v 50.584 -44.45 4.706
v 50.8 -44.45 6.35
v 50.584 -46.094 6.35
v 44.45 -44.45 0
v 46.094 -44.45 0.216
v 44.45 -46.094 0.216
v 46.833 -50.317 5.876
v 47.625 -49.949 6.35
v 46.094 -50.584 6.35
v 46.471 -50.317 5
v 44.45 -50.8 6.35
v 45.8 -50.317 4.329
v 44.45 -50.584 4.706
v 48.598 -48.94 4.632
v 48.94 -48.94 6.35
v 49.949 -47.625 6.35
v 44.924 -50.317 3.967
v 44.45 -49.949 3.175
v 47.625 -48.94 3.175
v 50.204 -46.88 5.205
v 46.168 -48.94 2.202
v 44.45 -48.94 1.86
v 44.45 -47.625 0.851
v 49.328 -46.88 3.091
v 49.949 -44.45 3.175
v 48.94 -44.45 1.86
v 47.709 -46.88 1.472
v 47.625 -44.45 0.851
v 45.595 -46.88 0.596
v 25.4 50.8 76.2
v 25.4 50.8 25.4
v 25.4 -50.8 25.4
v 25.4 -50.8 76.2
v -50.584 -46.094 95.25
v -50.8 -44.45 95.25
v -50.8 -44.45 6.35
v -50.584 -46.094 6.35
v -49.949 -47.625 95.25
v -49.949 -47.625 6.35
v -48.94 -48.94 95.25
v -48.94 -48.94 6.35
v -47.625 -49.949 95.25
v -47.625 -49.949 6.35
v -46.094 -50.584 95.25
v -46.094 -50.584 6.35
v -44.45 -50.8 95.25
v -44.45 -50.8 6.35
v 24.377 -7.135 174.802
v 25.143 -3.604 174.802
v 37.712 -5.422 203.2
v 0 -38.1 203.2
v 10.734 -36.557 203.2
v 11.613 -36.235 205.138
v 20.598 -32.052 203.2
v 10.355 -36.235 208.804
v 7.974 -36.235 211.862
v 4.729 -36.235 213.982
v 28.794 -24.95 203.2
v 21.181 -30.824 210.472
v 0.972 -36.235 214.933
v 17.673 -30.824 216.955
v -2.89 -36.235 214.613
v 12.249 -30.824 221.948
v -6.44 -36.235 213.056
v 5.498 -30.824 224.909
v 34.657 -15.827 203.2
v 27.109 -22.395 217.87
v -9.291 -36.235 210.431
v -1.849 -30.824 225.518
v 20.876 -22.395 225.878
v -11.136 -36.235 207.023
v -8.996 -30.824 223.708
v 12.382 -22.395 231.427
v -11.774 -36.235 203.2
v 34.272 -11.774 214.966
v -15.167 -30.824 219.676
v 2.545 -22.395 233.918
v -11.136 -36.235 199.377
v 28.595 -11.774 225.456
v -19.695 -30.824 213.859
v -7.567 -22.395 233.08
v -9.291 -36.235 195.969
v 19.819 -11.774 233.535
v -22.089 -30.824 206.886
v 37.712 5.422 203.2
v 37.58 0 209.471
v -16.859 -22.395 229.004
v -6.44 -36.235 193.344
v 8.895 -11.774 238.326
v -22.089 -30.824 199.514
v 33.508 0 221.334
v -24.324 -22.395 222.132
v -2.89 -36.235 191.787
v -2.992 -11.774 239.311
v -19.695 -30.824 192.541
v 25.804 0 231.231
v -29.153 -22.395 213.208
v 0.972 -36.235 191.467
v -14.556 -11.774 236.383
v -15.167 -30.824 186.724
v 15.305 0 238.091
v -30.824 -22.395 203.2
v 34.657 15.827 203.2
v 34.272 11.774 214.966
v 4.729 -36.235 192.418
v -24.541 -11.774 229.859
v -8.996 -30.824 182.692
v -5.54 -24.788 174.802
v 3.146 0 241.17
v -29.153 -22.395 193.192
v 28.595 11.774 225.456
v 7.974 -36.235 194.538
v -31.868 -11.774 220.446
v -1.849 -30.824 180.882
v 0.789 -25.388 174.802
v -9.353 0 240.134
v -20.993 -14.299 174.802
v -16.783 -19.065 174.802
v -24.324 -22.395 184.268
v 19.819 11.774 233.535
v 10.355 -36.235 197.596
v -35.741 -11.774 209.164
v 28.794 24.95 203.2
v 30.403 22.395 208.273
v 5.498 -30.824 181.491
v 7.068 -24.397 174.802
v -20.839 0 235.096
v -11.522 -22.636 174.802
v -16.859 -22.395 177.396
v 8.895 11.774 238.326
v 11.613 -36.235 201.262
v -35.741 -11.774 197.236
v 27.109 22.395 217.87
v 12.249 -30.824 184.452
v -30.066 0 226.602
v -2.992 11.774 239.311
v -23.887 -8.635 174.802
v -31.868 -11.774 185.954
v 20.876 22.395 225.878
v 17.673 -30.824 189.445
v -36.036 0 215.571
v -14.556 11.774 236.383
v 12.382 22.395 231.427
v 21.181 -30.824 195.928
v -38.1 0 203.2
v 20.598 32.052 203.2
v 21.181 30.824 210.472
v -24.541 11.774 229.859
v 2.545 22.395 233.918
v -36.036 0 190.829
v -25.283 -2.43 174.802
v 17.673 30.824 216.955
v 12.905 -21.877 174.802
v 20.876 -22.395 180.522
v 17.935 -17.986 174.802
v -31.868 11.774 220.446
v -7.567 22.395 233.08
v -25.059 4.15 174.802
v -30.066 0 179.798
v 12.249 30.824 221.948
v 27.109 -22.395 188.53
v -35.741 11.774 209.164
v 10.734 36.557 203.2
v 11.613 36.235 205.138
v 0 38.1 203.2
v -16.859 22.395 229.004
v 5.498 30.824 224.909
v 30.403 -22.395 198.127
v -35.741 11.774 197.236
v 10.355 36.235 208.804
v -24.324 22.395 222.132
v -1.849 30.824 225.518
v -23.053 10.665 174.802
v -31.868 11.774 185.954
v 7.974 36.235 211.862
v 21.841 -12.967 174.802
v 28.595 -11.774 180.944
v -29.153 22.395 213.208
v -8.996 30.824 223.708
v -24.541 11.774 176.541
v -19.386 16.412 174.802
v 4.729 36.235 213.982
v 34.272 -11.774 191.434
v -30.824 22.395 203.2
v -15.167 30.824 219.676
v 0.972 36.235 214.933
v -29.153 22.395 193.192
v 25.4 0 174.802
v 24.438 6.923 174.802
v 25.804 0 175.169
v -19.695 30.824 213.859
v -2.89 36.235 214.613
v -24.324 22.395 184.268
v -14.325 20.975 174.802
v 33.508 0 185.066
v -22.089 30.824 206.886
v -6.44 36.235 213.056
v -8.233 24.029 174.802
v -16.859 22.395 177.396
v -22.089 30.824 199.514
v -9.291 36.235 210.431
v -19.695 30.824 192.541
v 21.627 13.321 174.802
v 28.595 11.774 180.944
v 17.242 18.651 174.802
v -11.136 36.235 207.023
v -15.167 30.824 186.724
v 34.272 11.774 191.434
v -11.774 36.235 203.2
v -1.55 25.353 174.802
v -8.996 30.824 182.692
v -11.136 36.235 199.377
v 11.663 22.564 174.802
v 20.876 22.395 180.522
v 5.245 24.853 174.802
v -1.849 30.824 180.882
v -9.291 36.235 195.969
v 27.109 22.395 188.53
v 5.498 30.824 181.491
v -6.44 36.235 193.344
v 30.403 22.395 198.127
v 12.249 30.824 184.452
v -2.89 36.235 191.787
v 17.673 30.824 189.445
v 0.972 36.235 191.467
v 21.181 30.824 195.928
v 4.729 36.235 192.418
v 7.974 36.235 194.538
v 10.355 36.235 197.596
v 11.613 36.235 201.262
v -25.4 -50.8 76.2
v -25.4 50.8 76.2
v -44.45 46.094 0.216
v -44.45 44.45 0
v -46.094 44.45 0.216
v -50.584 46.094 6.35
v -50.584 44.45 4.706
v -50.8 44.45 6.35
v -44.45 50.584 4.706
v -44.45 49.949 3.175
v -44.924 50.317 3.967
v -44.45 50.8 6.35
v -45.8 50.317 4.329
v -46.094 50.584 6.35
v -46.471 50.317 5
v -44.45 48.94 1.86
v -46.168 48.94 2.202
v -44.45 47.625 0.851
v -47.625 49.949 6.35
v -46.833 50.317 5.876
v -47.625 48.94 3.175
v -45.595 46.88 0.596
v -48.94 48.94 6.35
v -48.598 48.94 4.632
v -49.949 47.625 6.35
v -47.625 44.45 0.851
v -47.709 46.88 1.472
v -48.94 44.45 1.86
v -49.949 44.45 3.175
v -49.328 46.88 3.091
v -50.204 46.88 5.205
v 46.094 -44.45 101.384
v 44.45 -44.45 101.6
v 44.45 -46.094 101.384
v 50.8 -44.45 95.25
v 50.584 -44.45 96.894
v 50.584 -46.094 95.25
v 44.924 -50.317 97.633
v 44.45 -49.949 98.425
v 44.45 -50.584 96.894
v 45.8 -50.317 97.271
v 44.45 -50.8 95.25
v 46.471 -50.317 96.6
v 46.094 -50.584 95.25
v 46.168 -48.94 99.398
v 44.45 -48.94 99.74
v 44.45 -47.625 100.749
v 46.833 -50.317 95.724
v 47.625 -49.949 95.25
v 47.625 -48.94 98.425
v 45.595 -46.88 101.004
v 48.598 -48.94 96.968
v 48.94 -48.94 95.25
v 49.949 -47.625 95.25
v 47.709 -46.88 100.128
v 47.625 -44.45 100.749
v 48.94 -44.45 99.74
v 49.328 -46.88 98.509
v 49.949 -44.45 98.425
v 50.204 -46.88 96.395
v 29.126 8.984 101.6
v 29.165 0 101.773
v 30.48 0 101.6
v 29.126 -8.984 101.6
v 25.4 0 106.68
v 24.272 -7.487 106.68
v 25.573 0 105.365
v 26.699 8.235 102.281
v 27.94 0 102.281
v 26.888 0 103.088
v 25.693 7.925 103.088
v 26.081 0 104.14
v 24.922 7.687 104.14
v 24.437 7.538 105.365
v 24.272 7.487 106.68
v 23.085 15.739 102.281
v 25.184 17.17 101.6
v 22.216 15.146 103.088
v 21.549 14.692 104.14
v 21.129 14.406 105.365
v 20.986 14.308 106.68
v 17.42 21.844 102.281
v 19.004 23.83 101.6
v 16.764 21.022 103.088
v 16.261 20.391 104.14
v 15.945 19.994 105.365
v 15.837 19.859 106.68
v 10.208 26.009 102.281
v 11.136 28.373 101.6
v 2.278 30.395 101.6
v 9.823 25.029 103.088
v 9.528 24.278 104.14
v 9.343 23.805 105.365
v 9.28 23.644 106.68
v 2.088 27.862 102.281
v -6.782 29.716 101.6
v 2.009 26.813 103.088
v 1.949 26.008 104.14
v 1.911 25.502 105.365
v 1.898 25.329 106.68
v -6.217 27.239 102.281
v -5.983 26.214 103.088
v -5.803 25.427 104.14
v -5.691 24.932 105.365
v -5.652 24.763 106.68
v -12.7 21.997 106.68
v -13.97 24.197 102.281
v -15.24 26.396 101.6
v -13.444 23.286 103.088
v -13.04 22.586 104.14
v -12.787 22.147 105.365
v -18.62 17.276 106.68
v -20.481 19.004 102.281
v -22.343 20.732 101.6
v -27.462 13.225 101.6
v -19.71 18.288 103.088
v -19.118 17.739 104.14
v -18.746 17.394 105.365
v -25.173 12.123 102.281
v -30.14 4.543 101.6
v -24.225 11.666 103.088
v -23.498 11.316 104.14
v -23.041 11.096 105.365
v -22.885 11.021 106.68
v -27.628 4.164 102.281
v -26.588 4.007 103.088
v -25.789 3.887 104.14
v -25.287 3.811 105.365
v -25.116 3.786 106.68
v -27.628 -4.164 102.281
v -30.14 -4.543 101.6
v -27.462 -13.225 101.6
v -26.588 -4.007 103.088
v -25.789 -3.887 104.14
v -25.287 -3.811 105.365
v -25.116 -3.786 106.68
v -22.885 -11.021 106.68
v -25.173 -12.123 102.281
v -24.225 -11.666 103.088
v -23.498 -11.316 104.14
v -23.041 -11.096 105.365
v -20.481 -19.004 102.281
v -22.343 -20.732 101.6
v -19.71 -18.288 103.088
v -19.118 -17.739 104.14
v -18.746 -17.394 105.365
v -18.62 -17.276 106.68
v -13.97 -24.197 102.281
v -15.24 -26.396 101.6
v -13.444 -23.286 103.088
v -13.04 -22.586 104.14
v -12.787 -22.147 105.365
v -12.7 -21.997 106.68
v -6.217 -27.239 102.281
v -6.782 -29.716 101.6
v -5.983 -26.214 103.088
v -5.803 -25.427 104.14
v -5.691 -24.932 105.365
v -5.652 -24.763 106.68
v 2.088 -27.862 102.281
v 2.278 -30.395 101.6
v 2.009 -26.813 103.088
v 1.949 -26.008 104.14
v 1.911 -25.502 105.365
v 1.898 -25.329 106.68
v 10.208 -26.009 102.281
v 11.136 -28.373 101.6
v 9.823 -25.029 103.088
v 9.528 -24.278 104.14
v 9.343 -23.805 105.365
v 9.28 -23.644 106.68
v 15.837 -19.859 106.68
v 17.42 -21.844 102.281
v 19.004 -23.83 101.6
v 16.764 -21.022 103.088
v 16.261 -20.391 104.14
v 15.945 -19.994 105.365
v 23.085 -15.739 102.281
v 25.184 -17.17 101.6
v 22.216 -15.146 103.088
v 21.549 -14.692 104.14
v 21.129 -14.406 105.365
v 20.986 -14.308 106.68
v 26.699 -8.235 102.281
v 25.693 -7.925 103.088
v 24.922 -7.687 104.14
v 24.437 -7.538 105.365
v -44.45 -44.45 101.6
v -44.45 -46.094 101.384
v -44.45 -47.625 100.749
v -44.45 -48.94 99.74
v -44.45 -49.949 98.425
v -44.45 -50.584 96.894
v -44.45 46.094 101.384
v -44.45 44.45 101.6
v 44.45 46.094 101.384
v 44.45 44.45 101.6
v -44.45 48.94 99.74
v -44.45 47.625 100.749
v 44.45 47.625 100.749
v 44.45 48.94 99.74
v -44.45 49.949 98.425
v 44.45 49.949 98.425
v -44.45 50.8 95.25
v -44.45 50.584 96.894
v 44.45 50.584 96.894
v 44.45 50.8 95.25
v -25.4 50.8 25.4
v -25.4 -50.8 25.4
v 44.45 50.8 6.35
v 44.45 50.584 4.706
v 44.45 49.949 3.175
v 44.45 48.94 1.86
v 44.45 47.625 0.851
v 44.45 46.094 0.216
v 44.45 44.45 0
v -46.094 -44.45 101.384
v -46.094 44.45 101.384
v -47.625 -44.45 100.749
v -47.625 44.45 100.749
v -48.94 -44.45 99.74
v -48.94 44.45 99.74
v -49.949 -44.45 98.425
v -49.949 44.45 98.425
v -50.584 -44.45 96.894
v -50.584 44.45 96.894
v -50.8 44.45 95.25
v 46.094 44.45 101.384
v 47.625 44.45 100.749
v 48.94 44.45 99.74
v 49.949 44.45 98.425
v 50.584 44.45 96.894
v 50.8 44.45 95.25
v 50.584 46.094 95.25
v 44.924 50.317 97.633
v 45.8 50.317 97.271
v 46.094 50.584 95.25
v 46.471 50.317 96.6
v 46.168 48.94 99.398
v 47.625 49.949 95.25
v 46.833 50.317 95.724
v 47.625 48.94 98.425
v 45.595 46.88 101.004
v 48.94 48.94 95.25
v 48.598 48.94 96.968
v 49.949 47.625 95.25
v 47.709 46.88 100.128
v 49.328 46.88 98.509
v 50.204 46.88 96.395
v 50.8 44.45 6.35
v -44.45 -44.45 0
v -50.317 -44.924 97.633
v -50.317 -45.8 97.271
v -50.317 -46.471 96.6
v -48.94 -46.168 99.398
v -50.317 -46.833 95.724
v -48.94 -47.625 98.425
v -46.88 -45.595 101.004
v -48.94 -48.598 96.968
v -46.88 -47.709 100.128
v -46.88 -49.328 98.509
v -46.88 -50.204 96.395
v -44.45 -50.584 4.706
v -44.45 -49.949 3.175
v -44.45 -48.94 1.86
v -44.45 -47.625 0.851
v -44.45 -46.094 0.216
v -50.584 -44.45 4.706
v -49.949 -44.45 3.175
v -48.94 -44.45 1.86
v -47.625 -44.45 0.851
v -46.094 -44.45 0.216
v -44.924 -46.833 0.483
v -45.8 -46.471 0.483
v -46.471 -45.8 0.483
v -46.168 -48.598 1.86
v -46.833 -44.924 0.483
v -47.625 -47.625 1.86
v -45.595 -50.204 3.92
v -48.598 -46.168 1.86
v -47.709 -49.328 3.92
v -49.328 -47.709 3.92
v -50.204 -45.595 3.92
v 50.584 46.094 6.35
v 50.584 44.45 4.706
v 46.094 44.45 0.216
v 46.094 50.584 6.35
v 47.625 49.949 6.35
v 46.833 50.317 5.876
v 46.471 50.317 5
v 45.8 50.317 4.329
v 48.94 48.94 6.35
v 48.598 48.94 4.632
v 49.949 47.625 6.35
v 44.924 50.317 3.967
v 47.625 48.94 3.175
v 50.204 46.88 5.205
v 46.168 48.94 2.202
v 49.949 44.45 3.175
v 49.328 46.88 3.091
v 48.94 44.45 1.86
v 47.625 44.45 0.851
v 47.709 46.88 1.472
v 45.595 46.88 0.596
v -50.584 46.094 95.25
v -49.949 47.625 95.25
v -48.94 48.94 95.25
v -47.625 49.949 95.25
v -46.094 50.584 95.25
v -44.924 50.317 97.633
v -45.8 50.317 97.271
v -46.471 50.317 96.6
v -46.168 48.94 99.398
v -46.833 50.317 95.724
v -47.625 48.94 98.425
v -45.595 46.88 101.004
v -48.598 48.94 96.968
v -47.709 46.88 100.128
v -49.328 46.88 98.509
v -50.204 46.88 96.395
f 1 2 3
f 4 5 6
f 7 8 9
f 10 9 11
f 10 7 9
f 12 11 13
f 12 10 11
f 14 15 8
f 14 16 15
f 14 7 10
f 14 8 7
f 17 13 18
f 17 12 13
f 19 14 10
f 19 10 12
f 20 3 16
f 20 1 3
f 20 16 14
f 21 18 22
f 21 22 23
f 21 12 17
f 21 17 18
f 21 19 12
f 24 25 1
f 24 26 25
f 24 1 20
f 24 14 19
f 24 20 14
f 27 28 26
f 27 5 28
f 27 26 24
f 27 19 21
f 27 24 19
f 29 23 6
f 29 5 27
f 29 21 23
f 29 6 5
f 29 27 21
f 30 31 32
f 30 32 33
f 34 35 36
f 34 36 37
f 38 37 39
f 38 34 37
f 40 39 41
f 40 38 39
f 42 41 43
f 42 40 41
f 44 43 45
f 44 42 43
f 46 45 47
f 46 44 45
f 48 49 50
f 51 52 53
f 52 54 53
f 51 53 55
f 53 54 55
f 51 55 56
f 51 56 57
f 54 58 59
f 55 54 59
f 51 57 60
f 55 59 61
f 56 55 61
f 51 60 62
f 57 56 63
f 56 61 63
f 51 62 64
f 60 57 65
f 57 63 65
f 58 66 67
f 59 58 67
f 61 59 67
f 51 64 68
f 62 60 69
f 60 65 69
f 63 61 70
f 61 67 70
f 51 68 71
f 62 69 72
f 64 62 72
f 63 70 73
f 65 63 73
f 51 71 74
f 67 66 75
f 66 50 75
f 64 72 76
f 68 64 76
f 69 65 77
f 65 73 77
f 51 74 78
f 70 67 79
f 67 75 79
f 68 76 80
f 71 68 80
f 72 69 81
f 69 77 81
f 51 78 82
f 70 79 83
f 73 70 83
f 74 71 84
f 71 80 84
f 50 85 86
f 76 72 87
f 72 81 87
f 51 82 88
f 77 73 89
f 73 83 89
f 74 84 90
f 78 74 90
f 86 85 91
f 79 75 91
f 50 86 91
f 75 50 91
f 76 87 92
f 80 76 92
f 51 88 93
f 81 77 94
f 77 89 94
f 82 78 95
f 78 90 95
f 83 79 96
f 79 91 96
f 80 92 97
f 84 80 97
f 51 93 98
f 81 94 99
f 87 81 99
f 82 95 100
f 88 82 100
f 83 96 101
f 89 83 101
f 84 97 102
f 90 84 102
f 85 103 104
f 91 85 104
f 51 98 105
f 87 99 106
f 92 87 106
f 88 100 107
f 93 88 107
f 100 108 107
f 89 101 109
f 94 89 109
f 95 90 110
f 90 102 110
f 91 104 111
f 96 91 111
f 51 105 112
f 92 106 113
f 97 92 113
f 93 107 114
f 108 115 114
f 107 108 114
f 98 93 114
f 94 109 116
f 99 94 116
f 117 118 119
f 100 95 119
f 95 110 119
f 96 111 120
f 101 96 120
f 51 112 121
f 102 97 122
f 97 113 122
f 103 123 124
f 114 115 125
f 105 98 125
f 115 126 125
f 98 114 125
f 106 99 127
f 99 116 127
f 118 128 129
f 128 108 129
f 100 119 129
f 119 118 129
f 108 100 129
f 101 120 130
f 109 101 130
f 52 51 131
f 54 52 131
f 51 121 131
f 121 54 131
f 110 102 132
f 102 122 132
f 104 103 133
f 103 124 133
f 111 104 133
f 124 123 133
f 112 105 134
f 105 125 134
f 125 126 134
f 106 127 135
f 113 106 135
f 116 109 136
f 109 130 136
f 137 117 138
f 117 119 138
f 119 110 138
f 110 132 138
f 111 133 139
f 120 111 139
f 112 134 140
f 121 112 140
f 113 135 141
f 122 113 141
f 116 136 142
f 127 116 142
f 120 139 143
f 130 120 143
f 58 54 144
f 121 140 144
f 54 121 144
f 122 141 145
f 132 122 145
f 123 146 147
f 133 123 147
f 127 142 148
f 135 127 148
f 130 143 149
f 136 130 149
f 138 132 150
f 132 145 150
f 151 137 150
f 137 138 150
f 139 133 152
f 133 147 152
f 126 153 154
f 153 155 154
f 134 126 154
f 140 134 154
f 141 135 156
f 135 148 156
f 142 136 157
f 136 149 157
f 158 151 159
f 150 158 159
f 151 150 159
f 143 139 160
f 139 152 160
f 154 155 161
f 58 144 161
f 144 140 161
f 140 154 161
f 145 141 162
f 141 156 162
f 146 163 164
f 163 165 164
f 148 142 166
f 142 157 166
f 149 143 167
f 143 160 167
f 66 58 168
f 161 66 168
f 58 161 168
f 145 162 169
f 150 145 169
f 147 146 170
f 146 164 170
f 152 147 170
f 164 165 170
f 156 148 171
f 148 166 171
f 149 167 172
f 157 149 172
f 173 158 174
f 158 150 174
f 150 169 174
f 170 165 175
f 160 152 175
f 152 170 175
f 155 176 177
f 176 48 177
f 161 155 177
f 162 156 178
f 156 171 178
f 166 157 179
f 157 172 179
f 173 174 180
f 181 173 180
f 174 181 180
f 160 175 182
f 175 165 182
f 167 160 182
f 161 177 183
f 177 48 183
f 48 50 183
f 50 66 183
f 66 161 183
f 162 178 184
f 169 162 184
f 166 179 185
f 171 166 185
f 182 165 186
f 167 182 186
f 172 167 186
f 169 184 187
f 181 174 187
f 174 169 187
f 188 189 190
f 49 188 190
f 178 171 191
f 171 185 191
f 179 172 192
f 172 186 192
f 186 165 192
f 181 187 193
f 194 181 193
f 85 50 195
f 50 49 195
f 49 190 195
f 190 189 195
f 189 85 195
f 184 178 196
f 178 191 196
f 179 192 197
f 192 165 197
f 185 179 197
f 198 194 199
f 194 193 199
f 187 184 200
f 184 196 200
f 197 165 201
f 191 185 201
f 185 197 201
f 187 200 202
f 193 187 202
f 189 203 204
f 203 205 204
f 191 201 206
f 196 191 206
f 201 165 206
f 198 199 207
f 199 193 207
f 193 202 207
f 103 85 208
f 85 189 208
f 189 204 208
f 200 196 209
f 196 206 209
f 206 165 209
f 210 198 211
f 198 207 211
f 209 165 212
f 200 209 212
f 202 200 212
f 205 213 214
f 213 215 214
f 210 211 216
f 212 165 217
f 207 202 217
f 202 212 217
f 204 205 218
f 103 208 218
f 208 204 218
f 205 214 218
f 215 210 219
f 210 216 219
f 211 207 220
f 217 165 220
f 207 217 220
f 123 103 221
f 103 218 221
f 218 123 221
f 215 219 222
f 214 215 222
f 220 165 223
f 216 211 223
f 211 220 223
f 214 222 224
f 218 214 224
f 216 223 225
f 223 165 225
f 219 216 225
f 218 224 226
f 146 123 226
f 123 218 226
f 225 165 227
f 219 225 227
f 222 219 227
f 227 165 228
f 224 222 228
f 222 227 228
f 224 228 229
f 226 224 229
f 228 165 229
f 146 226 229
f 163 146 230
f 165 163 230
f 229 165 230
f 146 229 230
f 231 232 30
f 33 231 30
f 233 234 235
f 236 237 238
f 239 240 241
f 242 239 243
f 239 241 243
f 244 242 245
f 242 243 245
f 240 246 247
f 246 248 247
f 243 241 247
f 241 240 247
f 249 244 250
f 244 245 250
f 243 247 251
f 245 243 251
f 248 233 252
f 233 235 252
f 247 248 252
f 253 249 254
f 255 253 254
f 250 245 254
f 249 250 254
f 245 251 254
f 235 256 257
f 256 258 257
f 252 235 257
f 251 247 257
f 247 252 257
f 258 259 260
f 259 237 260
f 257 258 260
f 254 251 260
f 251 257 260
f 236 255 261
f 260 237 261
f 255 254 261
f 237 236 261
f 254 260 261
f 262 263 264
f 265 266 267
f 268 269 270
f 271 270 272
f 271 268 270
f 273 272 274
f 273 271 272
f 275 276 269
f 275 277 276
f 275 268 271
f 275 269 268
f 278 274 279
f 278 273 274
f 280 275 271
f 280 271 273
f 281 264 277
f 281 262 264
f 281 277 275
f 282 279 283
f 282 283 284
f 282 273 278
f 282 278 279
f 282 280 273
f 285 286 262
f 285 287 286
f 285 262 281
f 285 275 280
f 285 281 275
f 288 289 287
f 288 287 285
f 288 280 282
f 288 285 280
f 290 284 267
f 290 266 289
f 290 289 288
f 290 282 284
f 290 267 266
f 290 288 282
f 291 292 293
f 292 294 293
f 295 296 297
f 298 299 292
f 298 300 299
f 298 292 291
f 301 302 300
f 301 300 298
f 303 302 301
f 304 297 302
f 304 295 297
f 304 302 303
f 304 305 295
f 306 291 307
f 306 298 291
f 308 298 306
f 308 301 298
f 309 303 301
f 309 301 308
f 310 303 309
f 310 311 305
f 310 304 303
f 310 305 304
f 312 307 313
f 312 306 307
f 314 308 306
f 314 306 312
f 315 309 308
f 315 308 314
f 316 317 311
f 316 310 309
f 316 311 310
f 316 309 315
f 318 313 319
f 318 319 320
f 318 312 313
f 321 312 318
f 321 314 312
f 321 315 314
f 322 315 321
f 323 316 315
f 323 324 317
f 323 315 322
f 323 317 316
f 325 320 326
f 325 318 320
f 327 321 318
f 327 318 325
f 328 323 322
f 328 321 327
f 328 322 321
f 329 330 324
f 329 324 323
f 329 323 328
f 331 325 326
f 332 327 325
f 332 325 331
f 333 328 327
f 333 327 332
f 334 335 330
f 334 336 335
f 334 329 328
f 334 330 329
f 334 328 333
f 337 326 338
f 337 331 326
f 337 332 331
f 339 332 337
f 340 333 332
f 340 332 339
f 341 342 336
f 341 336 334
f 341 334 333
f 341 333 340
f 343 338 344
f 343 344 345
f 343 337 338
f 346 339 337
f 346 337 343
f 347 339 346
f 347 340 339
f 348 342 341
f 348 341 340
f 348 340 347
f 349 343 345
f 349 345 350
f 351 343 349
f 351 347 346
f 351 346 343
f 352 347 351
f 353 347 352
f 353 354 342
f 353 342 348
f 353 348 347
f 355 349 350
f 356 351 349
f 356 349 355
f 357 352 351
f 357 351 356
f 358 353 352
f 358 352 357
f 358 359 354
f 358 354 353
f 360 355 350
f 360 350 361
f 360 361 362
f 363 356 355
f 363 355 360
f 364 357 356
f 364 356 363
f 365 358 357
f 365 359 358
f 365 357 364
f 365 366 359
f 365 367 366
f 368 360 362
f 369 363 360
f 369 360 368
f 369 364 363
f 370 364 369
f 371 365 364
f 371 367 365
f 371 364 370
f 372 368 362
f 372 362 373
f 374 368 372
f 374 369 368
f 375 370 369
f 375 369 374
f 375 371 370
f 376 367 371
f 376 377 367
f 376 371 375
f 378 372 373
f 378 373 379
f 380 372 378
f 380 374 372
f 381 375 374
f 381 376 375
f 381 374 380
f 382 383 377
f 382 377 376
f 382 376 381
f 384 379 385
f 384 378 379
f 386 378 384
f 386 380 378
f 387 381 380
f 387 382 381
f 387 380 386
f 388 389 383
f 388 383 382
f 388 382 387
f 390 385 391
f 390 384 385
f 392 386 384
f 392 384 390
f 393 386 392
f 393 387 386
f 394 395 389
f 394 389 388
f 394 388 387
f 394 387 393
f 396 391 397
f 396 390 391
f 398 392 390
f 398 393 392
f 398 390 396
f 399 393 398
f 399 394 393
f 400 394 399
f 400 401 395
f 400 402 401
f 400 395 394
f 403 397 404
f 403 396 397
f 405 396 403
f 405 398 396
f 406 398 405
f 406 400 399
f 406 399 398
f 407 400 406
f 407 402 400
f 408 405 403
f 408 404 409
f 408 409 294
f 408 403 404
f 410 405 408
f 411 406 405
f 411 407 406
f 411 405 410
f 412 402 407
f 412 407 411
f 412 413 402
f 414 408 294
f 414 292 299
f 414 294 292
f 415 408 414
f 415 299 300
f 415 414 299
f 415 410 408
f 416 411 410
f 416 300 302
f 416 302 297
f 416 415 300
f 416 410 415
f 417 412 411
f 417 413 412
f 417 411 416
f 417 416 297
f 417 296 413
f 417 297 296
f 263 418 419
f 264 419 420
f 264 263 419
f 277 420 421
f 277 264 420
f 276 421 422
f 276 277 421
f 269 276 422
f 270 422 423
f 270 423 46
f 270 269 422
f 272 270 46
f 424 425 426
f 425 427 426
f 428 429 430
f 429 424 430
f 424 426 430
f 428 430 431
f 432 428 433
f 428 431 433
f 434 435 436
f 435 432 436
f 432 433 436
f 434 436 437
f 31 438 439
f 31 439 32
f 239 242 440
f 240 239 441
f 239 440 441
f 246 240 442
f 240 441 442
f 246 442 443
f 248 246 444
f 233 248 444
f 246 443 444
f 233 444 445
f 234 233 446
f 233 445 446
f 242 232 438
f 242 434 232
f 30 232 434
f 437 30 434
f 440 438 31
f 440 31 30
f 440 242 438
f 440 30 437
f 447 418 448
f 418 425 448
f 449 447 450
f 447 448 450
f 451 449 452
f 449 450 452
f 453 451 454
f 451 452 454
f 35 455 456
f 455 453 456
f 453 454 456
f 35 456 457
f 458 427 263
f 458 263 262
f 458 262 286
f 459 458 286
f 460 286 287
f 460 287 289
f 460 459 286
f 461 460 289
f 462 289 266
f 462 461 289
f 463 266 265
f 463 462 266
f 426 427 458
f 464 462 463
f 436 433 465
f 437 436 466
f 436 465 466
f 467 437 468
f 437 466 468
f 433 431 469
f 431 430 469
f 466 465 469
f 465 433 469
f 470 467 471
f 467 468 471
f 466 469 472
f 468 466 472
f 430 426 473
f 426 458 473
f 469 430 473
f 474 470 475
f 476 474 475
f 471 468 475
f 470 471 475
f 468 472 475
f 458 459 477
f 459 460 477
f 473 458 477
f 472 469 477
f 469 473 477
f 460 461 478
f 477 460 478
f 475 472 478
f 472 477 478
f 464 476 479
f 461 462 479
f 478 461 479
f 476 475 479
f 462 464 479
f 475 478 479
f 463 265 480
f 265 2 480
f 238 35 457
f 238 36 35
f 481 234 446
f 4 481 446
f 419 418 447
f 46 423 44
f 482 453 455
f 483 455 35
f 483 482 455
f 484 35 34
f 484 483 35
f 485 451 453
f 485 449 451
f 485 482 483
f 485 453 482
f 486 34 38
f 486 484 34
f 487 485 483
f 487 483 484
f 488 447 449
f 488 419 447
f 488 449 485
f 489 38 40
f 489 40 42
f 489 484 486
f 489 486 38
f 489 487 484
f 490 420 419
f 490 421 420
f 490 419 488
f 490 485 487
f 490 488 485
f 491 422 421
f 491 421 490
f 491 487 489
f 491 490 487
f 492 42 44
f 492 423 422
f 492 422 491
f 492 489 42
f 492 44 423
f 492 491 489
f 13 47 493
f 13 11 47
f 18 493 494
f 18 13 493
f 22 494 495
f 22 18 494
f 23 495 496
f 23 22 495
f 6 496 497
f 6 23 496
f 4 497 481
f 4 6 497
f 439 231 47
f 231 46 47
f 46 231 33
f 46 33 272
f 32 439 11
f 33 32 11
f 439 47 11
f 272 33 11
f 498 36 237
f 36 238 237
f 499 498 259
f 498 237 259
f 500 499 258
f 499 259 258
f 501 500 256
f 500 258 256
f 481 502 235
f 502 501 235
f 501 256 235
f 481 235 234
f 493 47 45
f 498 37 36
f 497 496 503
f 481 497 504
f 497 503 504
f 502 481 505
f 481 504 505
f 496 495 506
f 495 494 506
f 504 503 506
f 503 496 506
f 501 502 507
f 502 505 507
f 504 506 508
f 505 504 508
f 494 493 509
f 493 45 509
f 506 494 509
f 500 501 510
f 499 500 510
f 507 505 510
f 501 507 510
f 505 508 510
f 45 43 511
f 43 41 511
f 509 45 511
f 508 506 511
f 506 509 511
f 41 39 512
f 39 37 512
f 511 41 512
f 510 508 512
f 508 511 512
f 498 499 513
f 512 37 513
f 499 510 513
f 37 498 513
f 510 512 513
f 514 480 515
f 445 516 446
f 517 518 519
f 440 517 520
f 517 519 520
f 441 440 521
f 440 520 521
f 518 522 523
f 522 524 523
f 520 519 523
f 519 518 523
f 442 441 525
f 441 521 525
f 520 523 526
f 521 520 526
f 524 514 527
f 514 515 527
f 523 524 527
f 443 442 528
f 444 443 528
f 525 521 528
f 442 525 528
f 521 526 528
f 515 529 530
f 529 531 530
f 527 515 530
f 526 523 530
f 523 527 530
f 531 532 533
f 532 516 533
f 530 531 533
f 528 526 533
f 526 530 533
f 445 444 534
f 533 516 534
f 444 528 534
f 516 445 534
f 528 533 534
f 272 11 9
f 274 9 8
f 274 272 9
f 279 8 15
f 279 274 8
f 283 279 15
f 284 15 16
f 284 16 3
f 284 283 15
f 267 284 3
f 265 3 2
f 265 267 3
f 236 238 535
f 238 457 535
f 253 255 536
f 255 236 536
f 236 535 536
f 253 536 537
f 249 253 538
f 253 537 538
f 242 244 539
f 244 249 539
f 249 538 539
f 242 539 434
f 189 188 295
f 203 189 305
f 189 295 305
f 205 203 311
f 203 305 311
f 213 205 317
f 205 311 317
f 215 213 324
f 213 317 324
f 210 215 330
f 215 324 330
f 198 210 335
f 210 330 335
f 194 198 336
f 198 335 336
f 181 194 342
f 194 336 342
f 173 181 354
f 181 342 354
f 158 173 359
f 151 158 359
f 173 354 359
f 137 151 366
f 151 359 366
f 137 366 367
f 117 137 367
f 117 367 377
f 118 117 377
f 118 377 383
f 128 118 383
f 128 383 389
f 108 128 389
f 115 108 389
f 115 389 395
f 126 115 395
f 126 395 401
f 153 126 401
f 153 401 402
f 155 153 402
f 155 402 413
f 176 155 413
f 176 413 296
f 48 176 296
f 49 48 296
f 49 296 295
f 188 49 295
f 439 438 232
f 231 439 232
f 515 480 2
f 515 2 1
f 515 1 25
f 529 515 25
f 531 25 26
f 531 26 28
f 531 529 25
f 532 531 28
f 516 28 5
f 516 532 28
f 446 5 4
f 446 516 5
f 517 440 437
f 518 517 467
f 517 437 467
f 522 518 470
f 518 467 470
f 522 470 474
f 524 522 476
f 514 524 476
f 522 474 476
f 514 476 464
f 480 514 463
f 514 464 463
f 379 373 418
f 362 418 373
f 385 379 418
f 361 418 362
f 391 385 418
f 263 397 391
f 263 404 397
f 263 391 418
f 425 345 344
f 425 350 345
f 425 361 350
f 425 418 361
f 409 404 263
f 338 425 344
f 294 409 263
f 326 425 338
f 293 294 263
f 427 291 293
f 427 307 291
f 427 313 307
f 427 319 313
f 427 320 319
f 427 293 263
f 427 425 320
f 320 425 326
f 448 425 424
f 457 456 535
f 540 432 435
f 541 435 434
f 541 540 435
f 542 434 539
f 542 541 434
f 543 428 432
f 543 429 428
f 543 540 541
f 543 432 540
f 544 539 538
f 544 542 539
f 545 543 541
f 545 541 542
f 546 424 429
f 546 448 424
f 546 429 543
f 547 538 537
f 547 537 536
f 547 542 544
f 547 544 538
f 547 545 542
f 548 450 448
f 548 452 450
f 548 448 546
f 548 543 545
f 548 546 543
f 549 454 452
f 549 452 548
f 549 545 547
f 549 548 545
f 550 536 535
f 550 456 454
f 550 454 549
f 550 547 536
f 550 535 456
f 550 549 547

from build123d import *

# Parameters (mm, degrees)
F0_W     = 101.6
F0_H     = 101.6
F1_DEPTH = 101.6
F2_R     = 25.4
F3_DEPTH = 101.6
F6_W     = 50.8
F6_H     = 50.8
F7_DEPTH = 101.6
F8_R     = 6.35
F9_R     = 5.08


with BuildPart() as f1:
    # F0 (on Top) → F1 (new body)
    with BuildSketch(Plane.XY):
        Rectangle(F0_W, F0_H)
    extrude(amount=F1_DEPTH)

    # F2 (on face) → F3 (join)
    with BuildSketch(Plane.XY.offset(101.6)):
        Circle(F2_R)
    extrude(amount=F3_DEPTH)

    # F4 (on face) → F5 (revolve)
    with BuildSketch(Plane.XY.offset(203.2)):
        with BuildLine():
            Line((0, -25.4), (0, -38.1))
            ThreePointArc((0, -38.1), (38.1, 0), (0, 38.1))
            Line((0, 38.1), (0, 25.4))
            ThreePointArc((0, 25.4), (17.9605122421, 17.9605122421), (25.4, 0))
            ThreePointArc((25.4, 0), (17.9605122421, -17.9605122421), (0, -25.4))
        make_face()
        with BuildLine():
            Line((0, 25.4), (0, -25.4))
            ThreePointArc((0, -25.4), (17.9605122421, -17.9605122421), (25.4, 0))
            ThreePointArc((25.4, 0), (17.9605122421, 17.9605122421), (0, 25.4))
        make_face()
    revolve(axis=Axis((0, 0, 203.2), (0, -1, 0)))

    # F6 (on face) → F7 (cut)
    with BuildSketch(Plane.XZ.offset(50.8)):
        with Locations((0, 50.8)):
            Rectangle(F6_W, F6_H)
    extrude(amount=-F7_DEPTH, mode=Mode.SUBTRACT)

    # F8
    f8_edges = [f1.edges().sort_by_distance(p)[0] for p in [
        (50.8, 0, 101.6),
        (0, -50.8, 101.6),
        (-50.8, 0, 101.6),
        (0, 50.8, 101.6),
        (50.8, 0, 0),
        (50.8, 50.8, 50.8),
        (50.8, -50.8, 50.8),
        (-50.8, -50.8, 50.8),
        (0, -50.8, 0),
        (-50.8, 0, 0),
        (0, 50.8, 0),
        (-50.8, 50.8, 50.8),
    ]]
    fillet(f8_edges, radius=F8_R)

    # F9
    f9_edges = [f1.edges().sort_by_distance(p)[0] for p in [
        (-25.4, 0, 101.6),
    ]]
    fillet(f9_edges, radius=F9_R)


solid = f1.part
